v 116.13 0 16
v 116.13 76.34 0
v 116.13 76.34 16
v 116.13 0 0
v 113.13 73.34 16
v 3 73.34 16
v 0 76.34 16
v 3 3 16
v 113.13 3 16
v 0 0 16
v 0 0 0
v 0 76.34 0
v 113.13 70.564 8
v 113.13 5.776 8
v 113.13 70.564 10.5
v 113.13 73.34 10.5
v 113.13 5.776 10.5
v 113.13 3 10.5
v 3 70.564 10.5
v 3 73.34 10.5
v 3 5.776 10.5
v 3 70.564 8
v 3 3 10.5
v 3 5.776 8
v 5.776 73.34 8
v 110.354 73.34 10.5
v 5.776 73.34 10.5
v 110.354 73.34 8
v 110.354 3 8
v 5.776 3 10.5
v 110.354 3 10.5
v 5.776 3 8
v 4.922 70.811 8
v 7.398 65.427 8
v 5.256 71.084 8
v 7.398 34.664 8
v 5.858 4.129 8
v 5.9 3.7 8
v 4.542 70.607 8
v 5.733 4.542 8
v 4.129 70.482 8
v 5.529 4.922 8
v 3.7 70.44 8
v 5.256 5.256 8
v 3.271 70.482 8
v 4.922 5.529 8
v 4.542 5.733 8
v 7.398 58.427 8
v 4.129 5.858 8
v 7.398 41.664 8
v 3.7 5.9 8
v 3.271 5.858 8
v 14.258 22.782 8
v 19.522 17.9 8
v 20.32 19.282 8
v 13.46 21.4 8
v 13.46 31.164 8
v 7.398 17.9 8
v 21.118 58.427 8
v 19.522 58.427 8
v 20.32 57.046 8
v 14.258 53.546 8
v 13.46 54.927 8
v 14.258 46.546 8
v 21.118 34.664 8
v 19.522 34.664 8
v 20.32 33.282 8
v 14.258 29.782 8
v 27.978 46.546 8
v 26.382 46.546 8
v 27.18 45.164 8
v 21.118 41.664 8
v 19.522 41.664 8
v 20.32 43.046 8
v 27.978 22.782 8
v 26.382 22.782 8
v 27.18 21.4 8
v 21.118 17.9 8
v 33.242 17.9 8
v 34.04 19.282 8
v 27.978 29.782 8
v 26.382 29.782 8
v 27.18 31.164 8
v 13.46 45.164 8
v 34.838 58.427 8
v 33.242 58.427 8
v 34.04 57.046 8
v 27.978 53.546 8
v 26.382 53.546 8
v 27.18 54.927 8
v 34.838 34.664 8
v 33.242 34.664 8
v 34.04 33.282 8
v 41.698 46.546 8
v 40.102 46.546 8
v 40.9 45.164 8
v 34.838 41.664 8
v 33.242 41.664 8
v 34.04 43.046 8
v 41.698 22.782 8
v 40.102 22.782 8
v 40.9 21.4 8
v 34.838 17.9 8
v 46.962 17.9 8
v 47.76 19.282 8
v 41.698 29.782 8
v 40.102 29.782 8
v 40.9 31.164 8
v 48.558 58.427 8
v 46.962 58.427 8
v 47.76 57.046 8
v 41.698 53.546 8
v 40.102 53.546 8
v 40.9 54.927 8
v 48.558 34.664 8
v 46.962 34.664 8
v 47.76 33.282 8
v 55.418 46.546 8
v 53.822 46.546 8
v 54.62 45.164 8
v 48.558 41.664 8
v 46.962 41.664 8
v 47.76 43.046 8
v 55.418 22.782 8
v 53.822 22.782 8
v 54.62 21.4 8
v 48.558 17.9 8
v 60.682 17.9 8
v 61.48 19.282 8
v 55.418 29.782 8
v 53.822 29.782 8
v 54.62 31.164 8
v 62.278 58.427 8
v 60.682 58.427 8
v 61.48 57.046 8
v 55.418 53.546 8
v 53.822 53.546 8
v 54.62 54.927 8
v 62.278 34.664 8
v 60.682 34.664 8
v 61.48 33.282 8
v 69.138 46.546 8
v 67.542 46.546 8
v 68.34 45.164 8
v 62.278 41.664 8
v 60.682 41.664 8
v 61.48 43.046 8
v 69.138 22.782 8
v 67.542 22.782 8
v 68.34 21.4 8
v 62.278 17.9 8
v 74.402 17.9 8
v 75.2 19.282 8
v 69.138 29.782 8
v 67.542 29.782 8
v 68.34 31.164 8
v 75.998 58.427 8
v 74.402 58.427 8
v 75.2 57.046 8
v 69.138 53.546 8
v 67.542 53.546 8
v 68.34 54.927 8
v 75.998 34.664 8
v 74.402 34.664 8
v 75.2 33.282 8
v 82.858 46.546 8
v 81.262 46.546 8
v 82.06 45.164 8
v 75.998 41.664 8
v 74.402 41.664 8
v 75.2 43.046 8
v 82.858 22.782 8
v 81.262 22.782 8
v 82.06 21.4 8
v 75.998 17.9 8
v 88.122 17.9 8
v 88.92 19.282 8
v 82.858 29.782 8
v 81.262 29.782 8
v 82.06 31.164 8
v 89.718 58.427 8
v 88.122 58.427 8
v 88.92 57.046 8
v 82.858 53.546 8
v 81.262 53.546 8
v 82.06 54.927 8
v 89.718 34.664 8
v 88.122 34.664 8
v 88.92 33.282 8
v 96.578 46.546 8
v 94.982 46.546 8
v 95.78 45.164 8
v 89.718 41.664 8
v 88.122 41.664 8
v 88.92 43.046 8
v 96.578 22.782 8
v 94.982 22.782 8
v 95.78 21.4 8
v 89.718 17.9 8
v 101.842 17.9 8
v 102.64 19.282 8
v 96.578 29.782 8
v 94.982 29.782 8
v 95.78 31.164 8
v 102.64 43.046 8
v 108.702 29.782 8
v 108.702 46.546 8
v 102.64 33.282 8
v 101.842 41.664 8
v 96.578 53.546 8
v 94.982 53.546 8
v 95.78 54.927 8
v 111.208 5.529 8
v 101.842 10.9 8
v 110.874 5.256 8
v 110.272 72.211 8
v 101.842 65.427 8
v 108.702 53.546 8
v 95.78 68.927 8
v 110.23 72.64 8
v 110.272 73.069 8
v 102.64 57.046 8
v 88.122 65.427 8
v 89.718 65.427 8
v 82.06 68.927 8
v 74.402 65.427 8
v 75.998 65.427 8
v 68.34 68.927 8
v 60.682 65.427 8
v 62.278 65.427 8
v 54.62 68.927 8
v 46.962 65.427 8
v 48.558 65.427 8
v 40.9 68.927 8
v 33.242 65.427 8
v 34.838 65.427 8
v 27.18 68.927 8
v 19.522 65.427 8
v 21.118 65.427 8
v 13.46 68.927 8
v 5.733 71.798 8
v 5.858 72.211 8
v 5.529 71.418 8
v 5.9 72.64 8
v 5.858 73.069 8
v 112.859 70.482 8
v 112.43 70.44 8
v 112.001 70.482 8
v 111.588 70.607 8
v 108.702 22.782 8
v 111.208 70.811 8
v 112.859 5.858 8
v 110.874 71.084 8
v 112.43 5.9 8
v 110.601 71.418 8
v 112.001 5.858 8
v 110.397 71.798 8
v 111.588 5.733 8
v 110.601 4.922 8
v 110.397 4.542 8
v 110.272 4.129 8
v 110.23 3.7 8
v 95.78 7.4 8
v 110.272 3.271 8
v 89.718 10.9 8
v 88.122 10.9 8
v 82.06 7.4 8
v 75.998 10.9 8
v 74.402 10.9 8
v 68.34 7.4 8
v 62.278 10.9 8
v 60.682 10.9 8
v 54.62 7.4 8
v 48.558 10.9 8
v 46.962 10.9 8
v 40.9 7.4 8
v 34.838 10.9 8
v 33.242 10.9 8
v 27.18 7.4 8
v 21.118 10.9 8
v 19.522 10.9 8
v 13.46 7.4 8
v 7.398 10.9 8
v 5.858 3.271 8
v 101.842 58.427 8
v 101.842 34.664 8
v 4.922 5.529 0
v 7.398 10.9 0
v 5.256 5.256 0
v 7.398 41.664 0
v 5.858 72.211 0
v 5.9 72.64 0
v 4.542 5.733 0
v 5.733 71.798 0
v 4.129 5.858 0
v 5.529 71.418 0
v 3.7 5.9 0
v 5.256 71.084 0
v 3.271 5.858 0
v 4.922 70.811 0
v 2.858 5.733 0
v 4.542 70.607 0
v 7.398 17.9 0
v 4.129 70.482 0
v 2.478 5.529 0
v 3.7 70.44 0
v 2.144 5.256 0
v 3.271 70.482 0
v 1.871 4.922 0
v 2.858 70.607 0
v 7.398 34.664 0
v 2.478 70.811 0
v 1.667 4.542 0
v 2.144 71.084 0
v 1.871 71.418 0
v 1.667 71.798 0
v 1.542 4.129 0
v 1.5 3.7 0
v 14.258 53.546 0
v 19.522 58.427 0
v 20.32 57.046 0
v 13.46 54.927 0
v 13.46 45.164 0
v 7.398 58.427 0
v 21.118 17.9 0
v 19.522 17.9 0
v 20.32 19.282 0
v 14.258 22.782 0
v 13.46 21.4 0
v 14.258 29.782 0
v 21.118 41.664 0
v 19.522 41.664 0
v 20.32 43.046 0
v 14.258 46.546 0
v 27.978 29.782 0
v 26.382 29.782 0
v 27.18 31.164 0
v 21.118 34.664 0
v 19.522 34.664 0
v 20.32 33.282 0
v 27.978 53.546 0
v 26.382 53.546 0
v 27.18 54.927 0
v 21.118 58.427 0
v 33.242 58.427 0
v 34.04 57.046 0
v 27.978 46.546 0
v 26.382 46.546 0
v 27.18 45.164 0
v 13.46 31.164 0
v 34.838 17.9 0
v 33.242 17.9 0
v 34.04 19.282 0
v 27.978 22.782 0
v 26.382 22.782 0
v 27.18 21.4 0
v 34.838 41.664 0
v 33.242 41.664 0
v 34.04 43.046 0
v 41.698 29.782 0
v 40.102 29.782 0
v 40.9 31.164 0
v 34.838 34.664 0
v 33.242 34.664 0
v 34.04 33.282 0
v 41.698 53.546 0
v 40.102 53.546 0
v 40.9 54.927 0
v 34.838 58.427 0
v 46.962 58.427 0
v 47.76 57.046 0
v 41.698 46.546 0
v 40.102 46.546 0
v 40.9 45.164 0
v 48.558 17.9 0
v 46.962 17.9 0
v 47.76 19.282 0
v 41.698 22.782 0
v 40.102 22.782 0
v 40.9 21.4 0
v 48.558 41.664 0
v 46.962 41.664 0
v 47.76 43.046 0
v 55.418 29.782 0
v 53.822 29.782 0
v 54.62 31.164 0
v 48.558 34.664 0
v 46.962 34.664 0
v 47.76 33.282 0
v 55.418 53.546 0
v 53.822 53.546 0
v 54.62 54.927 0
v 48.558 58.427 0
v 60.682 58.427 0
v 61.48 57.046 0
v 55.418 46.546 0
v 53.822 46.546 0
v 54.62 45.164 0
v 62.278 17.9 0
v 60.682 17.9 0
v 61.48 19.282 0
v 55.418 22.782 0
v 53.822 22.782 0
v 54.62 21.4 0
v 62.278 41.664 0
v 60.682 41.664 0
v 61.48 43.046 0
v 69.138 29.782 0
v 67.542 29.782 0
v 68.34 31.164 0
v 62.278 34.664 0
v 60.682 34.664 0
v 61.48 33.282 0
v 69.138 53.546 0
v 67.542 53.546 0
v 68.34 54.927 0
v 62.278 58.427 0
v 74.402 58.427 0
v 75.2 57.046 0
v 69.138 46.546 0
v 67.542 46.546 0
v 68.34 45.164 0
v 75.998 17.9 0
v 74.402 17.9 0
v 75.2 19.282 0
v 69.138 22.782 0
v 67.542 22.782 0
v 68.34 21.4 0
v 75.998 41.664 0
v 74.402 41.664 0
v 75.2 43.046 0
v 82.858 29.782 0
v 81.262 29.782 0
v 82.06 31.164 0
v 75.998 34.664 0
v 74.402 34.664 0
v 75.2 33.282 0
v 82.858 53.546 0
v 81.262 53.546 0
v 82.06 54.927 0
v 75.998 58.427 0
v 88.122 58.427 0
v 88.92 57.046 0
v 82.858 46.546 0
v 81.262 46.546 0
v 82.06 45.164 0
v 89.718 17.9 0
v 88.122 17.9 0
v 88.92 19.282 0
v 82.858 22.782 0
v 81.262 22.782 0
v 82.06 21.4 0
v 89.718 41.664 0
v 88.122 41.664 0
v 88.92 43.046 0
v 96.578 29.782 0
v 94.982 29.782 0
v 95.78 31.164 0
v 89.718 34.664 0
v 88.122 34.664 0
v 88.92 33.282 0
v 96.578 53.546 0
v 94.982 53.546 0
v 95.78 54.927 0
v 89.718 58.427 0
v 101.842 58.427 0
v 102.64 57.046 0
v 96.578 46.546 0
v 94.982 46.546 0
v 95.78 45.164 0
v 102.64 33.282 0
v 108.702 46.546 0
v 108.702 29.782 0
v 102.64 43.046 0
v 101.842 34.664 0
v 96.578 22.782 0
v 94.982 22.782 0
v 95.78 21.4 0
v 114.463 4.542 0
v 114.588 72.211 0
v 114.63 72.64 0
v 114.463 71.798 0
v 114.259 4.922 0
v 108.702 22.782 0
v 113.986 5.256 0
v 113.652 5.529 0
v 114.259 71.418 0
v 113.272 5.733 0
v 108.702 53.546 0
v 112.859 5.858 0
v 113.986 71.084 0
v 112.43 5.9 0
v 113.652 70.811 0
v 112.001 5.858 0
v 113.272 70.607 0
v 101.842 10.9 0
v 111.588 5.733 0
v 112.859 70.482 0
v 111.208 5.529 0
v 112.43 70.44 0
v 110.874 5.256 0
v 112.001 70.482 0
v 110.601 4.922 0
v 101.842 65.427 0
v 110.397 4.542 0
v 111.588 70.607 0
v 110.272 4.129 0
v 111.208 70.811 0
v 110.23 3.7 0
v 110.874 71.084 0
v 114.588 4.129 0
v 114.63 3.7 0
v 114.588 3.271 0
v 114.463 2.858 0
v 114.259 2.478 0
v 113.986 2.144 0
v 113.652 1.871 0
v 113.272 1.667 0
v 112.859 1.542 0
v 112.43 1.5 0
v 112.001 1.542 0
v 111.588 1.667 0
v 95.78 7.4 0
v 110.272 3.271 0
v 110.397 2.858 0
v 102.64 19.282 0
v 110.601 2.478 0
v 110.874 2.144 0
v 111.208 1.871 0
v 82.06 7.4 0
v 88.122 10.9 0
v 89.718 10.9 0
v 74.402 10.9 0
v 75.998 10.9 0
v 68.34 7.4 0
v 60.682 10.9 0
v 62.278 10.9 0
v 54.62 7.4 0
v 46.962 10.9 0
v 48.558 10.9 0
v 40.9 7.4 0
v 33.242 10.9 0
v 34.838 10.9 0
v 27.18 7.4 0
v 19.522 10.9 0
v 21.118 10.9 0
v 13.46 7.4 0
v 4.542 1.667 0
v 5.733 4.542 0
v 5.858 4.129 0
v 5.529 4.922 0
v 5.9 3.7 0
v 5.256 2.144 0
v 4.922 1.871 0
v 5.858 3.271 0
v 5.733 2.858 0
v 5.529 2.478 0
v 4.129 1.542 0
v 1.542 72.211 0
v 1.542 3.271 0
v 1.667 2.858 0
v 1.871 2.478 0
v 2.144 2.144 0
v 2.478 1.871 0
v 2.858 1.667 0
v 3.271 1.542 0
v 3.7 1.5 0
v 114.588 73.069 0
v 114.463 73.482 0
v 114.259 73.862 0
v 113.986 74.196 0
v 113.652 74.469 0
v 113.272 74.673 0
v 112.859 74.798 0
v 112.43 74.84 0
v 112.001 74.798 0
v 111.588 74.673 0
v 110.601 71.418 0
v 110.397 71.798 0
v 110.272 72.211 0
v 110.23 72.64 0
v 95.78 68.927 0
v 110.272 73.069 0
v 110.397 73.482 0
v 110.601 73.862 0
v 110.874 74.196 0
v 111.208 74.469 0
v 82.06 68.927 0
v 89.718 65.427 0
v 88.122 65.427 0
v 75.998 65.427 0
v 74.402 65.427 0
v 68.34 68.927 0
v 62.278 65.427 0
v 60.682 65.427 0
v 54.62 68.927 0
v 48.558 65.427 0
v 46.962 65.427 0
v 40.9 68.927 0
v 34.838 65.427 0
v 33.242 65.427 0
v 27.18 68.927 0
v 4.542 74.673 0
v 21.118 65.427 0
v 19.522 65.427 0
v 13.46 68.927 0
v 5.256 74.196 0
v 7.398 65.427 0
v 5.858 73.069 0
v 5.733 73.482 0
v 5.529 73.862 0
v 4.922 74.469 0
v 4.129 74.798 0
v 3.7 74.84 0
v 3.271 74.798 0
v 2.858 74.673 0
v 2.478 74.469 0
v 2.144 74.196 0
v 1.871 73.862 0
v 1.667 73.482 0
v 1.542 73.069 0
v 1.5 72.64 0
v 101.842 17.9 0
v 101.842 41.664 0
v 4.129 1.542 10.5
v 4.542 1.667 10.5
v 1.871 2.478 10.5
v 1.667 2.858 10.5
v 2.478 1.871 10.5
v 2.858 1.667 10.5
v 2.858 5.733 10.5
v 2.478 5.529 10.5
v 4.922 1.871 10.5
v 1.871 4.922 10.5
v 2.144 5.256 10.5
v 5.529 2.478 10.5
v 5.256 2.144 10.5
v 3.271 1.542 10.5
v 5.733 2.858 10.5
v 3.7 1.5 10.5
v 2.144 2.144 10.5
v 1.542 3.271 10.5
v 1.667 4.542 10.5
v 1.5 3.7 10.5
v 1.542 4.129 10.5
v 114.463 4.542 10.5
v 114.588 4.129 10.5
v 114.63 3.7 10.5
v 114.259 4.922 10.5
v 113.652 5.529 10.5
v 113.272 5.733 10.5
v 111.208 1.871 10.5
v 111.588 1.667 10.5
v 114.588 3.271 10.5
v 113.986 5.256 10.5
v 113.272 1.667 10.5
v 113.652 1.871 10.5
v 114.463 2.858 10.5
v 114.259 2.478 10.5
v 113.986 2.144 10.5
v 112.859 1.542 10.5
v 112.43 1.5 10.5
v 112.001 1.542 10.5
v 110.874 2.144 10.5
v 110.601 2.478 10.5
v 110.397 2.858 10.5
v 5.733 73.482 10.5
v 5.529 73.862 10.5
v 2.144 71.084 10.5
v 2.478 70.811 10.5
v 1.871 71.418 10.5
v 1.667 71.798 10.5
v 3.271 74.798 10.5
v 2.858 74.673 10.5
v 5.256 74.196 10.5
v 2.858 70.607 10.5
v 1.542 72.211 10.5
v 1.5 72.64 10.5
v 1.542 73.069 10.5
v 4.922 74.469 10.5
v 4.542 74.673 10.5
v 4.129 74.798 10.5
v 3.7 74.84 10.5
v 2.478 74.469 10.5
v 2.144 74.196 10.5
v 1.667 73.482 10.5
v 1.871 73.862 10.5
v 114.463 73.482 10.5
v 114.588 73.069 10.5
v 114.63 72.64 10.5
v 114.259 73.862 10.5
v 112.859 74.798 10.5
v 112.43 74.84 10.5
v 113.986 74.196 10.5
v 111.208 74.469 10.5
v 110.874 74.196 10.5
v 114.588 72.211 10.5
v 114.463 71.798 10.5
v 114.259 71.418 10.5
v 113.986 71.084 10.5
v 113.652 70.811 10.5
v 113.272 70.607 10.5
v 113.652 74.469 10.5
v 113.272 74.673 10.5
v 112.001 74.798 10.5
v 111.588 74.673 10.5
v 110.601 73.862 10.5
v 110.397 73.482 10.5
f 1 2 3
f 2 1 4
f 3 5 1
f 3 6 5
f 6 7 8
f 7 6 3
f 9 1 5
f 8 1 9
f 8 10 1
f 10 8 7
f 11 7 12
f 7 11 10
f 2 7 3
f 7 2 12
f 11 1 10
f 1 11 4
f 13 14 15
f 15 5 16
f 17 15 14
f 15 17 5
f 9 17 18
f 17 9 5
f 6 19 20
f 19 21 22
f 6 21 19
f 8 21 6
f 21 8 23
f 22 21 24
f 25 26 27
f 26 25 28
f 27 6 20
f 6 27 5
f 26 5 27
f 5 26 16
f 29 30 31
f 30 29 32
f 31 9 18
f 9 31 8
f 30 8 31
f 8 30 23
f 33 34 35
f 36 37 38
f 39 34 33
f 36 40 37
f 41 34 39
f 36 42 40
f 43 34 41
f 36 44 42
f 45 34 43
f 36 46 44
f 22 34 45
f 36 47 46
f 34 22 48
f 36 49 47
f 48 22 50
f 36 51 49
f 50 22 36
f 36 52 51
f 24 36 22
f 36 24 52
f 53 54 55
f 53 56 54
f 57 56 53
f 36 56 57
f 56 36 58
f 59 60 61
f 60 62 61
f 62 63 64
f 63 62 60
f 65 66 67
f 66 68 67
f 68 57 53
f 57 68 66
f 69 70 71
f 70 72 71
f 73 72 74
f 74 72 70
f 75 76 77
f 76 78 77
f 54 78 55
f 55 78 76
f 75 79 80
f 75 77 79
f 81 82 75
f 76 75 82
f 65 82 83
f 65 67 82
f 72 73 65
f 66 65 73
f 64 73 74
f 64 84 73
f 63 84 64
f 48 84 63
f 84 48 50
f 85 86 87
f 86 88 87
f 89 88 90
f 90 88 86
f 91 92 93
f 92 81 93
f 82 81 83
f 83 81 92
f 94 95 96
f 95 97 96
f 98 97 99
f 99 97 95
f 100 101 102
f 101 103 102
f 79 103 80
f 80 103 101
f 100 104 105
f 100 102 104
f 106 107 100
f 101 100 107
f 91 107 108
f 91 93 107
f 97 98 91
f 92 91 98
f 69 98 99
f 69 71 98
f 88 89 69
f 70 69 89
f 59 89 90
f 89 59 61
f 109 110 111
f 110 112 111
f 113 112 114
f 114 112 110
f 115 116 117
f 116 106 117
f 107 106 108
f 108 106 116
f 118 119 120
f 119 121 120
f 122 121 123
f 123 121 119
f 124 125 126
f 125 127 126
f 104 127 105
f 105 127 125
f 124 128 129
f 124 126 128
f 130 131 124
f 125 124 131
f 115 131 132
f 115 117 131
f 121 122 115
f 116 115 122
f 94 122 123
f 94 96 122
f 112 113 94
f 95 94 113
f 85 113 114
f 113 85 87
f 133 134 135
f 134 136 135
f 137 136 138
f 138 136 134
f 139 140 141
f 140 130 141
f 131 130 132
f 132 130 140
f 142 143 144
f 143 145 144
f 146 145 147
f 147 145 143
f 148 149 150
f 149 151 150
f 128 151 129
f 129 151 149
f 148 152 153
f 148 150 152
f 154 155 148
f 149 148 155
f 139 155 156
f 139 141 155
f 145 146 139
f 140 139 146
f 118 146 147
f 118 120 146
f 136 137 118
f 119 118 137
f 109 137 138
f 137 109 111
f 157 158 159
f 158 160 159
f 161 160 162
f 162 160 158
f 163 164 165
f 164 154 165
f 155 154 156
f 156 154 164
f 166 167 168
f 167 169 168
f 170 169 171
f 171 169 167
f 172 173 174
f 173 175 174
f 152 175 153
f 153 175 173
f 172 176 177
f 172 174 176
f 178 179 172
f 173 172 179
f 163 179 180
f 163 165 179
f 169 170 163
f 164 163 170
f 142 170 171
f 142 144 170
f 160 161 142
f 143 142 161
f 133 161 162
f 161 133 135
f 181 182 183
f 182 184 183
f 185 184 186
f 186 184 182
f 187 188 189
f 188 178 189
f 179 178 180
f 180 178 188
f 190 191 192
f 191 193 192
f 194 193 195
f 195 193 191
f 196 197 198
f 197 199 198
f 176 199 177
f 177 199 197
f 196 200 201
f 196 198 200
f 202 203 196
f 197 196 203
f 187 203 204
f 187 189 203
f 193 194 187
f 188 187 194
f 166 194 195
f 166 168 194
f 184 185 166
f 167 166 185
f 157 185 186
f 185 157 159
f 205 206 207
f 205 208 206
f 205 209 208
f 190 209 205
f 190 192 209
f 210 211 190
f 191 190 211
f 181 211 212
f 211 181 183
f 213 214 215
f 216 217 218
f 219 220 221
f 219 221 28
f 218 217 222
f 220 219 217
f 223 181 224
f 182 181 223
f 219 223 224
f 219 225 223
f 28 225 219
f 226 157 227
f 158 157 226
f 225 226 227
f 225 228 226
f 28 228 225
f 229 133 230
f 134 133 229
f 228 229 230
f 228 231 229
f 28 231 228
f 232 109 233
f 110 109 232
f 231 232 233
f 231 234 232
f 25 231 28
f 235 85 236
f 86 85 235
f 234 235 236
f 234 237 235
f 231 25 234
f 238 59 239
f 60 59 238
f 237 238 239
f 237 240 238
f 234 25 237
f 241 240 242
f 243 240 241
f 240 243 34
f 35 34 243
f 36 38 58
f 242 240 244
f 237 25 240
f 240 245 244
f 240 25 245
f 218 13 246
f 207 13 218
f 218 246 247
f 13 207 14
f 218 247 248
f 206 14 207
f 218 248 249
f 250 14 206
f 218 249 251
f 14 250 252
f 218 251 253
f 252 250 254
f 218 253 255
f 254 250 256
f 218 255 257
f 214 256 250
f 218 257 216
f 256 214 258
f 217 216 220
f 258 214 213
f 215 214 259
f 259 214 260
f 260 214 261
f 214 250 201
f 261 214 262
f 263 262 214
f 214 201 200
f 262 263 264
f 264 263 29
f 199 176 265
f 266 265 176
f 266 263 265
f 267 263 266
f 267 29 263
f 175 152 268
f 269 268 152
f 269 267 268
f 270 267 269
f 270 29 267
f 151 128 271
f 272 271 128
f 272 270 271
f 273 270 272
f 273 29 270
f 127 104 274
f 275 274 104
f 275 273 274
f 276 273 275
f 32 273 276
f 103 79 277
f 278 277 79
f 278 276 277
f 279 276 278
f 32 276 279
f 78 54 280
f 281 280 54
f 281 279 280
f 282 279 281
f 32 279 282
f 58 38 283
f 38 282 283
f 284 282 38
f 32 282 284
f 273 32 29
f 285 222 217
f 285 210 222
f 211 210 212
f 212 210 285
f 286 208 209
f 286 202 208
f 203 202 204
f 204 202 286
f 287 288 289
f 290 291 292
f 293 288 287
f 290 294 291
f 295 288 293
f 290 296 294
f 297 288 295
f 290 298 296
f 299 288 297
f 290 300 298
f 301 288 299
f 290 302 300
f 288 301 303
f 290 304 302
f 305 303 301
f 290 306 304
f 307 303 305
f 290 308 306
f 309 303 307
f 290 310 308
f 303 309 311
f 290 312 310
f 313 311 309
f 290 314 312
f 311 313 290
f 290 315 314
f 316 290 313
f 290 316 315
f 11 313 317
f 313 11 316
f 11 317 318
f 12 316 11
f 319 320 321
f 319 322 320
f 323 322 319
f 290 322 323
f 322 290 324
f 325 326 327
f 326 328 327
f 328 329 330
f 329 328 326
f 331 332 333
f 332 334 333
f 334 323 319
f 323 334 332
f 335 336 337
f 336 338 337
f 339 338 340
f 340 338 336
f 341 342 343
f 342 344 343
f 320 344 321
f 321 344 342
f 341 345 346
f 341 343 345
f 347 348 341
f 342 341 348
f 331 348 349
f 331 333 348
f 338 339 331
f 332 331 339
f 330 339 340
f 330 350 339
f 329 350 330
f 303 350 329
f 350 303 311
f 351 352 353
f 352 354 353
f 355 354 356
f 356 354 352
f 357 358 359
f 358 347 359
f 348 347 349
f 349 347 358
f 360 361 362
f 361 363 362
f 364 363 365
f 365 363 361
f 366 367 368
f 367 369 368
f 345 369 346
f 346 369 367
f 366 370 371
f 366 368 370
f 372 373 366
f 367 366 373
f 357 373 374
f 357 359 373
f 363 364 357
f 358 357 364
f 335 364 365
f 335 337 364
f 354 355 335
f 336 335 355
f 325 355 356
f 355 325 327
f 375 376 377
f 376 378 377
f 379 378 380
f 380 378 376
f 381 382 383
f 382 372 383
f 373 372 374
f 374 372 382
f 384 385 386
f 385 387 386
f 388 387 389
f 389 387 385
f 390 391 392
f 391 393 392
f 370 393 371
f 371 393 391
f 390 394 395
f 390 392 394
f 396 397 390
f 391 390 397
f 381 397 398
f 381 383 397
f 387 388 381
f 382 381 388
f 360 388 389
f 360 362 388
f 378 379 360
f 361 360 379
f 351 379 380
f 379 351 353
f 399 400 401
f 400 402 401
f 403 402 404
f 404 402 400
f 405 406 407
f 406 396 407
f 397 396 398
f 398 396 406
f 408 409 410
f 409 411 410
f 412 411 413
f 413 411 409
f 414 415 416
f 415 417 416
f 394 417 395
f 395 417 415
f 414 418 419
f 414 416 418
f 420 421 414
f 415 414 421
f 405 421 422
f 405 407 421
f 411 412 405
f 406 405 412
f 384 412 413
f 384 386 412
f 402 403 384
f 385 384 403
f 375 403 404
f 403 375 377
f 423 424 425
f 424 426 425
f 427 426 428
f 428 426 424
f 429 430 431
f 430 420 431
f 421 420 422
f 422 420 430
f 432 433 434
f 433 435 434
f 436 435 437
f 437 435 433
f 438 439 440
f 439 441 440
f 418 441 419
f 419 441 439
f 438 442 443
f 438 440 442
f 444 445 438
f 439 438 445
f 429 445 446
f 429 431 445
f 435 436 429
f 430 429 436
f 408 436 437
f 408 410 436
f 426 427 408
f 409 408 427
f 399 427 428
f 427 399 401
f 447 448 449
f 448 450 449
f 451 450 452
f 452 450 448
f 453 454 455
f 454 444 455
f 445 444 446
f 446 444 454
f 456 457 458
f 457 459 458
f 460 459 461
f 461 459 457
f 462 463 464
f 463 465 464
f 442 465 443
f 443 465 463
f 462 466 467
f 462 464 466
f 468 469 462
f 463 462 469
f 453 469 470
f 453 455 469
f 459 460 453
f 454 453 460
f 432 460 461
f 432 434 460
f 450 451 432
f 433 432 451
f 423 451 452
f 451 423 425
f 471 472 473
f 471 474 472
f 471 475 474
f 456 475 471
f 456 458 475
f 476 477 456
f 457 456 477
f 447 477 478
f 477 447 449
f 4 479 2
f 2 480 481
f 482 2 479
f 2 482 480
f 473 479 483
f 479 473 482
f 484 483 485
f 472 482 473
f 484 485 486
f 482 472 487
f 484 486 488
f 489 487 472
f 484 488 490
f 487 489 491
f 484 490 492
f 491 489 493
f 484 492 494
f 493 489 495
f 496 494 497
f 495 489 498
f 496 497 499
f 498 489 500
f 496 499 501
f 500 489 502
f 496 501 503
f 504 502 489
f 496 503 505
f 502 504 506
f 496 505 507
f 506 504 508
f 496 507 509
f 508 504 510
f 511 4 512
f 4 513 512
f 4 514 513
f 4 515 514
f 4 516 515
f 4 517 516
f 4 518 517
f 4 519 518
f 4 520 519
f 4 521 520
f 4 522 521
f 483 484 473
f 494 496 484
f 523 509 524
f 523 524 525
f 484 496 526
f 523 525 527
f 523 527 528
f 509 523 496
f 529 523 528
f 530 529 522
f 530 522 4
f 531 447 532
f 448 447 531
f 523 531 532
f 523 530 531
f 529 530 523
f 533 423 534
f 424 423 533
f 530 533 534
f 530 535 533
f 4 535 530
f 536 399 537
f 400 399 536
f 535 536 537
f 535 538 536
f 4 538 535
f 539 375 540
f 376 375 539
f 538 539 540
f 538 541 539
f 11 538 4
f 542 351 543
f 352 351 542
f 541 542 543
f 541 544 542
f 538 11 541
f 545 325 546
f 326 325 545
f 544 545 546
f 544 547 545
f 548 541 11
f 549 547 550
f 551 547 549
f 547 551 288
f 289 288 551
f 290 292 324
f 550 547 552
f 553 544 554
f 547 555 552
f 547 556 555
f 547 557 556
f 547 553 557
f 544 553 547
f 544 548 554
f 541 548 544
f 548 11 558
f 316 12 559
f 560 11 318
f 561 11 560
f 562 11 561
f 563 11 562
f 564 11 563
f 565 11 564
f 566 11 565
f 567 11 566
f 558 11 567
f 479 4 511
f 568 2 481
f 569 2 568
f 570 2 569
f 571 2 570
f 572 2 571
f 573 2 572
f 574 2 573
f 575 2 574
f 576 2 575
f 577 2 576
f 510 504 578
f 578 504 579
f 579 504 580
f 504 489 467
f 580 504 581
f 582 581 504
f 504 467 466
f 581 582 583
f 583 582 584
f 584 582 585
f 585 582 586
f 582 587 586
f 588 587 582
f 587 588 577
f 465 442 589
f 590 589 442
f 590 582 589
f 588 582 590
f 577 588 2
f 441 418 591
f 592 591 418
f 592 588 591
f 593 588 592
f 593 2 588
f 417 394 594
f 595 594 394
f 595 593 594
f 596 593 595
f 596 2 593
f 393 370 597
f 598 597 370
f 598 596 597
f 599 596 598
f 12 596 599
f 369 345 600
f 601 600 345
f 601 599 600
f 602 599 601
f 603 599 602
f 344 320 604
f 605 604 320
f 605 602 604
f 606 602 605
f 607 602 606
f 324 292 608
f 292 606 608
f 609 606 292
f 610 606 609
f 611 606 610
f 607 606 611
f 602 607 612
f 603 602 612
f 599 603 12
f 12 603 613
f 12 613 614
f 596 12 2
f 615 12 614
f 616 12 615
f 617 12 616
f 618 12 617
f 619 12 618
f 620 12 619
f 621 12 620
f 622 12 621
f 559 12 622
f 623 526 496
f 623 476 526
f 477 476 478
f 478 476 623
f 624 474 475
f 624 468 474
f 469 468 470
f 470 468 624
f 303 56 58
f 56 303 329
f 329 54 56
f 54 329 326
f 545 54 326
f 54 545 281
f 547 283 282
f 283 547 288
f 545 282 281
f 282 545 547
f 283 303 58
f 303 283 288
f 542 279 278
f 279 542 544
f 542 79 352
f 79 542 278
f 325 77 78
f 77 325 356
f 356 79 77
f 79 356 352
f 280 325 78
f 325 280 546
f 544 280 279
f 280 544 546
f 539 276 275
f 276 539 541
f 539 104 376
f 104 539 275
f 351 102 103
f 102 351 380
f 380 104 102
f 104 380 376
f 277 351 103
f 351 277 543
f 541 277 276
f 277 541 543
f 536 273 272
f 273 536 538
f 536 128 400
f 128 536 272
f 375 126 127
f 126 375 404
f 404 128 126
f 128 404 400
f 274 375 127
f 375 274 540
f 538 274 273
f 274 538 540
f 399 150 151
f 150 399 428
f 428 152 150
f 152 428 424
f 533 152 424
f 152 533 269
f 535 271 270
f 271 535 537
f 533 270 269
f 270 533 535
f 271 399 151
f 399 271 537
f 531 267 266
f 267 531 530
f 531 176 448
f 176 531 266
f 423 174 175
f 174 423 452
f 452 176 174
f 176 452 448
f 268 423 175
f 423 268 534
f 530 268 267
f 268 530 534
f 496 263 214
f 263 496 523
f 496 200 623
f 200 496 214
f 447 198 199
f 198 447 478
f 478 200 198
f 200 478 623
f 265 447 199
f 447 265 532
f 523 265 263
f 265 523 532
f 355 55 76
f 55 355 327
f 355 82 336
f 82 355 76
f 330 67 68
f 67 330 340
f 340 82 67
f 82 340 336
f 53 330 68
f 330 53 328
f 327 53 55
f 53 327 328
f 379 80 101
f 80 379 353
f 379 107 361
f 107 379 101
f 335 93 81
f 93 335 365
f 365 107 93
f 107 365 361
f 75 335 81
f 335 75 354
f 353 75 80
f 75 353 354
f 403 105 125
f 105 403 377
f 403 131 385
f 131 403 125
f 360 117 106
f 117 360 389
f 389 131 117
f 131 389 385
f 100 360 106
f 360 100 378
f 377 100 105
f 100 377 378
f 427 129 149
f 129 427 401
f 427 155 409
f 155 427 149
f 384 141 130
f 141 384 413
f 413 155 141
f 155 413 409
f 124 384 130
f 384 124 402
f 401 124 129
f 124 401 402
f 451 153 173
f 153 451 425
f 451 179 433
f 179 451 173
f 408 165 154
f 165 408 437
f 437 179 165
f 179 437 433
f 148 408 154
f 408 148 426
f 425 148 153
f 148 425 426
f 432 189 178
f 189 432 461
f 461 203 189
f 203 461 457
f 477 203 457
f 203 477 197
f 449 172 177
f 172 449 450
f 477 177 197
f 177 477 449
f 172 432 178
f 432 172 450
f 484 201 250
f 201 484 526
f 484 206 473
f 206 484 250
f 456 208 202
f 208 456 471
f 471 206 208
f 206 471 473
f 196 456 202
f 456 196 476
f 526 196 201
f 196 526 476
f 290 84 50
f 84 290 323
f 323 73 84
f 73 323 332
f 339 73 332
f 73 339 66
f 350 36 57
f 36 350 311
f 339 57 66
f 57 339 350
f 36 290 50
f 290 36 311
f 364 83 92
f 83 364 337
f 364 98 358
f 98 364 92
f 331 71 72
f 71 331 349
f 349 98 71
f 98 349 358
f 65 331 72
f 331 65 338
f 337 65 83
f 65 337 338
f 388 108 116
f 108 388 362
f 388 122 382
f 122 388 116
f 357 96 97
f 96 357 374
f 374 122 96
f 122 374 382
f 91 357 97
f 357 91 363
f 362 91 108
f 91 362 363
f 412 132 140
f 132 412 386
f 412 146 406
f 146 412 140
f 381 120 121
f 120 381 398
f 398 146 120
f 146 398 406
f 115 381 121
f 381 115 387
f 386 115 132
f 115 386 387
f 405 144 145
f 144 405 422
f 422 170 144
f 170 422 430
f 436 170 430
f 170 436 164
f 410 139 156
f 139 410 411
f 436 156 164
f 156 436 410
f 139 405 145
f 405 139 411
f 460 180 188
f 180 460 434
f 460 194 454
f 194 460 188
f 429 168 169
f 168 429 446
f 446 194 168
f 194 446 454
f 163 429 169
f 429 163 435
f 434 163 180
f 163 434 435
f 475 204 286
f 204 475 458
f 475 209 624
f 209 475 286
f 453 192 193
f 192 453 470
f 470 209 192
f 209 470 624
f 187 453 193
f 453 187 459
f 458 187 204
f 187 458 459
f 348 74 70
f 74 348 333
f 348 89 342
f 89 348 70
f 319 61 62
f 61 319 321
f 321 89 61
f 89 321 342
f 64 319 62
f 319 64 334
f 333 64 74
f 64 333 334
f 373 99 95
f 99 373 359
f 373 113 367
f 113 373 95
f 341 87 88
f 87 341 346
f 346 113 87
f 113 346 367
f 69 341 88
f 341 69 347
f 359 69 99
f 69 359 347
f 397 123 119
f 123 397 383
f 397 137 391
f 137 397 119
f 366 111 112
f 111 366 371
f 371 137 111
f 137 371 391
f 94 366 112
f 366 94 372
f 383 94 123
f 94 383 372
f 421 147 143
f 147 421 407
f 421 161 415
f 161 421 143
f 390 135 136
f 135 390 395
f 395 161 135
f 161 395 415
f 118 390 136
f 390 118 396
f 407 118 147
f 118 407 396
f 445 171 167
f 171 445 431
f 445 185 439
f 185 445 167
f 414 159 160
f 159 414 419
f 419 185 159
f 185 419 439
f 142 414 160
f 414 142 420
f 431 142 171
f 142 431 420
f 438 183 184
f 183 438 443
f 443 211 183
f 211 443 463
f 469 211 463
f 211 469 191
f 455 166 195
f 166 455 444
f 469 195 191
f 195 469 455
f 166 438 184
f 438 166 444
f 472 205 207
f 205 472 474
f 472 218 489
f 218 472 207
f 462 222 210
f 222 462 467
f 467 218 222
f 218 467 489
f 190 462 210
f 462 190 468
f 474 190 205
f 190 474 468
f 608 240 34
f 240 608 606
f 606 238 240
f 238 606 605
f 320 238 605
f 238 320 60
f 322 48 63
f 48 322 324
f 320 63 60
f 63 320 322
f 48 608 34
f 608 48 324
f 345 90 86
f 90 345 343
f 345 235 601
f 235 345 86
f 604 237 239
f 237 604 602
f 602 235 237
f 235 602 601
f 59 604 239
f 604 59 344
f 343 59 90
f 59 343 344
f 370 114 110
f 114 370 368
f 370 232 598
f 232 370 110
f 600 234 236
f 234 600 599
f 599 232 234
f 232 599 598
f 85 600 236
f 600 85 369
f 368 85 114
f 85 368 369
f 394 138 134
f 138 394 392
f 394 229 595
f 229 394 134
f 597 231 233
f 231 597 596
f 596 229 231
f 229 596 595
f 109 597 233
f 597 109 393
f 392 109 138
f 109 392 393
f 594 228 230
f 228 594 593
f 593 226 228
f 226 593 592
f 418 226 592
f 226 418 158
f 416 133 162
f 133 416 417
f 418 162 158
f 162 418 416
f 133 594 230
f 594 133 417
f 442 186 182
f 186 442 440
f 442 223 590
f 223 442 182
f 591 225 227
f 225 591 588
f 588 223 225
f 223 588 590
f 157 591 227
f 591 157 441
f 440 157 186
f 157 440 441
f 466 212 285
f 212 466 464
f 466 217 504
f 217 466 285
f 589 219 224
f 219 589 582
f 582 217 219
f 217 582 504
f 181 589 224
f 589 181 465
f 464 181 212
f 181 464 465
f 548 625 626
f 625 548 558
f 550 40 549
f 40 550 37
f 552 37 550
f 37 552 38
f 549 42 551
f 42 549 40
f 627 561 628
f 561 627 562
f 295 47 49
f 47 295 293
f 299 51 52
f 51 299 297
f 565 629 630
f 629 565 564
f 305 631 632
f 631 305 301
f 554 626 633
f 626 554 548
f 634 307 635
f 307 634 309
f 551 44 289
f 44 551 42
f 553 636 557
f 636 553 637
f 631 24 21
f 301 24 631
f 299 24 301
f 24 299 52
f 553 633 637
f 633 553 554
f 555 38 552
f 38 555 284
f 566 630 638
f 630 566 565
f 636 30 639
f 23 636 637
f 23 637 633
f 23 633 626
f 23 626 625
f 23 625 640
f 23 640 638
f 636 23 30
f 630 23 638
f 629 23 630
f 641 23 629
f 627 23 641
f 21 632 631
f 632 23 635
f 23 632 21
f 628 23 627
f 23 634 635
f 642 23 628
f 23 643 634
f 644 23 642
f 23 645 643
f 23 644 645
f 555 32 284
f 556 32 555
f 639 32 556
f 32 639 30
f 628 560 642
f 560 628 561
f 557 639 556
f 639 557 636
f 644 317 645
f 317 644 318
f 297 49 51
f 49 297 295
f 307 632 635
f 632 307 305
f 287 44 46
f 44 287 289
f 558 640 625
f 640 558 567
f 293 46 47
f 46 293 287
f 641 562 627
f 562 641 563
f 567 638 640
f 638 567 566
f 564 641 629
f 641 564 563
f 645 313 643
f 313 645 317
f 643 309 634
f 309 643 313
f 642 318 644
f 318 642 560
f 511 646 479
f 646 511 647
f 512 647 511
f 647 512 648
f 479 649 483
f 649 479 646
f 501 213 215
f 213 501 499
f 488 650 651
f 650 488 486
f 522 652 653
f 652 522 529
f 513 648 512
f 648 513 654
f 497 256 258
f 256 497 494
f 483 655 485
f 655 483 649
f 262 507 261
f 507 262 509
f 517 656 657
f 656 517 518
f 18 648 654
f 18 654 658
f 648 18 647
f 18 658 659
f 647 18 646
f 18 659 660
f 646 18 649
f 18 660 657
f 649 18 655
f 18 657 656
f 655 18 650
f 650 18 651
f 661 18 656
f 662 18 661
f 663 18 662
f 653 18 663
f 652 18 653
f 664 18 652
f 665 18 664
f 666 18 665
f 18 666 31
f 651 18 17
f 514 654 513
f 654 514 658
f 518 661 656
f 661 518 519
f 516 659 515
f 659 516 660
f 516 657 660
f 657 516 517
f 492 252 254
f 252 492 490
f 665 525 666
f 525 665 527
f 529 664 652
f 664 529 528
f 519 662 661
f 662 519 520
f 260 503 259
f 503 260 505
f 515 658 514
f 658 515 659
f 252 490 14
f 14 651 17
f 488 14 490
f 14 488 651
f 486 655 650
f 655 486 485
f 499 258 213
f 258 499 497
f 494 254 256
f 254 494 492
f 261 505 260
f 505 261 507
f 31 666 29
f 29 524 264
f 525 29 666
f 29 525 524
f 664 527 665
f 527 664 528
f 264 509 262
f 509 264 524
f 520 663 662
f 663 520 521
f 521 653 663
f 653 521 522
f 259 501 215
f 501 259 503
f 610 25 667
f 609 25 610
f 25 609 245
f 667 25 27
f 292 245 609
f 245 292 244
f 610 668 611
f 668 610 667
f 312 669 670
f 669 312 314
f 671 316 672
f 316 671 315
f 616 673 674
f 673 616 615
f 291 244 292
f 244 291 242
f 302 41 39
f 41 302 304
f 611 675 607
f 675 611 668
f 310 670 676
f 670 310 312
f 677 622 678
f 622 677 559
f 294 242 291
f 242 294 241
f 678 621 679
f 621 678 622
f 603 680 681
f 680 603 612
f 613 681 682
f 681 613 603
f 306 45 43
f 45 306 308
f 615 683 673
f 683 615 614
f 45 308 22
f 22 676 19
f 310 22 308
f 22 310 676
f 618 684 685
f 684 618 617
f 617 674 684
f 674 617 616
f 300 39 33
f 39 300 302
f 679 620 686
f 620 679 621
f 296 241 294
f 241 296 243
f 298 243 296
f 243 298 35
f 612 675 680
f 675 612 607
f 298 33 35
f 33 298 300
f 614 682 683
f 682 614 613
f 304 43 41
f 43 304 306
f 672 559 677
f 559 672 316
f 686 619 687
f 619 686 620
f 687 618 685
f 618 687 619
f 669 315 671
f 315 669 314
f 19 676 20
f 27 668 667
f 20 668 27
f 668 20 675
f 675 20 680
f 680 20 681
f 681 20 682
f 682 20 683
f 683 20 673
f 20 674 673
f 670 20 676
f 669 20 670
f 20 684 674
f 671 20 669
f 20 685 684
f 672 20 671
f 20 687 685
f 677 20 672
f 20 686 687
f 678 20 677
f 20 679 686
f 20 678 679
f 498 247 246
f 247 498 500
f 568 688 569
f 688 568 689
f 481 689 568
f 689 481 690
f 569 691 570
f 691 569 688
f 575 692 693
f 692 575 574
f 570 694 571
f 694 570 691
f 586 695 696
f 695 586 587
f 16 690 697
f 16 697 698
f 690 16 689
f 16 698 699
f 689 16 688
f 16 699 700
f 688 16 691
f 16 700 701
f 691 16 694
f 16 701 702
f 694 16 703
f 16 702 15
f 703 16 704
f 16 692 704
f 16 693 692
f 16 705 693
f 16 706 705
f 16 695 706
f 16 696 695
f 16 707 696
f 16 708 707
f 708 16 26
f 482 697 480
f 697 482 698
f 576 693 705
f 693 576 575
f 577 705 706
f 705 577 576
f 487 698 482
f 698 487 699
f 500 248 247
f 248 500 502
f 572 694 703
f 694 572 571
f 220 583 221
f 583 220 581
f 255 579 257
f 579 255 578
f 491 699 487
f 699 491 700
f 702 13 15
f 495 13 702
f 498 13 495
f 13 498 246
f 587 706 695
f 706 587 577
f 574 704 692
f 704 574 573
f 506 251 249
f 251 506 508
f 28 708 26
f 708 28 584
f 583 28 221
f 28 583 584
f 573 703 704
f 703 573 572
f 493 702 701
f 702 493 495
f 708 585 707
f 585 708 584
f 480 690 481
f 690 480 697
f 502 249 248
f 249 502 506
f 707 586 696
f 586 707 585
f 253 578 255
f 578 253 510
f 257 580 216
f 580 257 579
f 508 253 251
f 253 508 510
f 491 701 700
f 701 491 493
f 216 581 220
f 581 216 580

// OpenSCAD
$fn = 32;

// ----------------------------------------------------------------------
// Honeycomb panel: 116.13 x 76.34 mm, 35 cells of 14 mm
// ----------------------------------------------------------------------

// --- parameters (mm) ---
panel_w = 116.13;         // panel width
panel_d = 76.34;          // panel depth
thick = 8;                // panel thickness
cell_r = 7;               // hex cell circumradius
pitch = 13.72;            // hex cell pitch (centre to centre)
web = 1.6;                // web between the cells
columns = 7;              // columns of cells
rows = 5;                 // rows of cells
cell_count = 35;          // total cells
shift_x = 13.46;          // first cell offset in x
shift_y = 14.4;           // first cell offset in y
mount_d = 4.4;            // corner mounting holes
hole_off = 3.7;           // mounting hole offset from the corners
rim_h = 16;               // rim height
rim_t = 3;                // rim wall thickness

difference() {
  union() {
    cube([panel_w, panel_d, thick]);
    /* rim around the panel, sunk 1 mm into the plate */
    translate([0, 0, thick - 1]) difference() {
      cube([panel_w, panel_d, rim_h - thick + 1]);
      translate([rim_t, rim_t, -2.5]) cube([panel_w - 2 * rim_t, panel_d - 2 * rim_t, rim_h - thick + 6]);
    }
  }
  /* hexagonal cells, point-up, cut right through the plate */
  for (row = [0 : rows - 1]) {
    for (col = [0 : columns - 1]) {
      translate([shift_x + col * pitch + (row % 2) * pitch / 2, shift_y + row * pitch * 0.866025, -2.5]) rotate([0, 0, 30]) cylinder(h = thick + 5, d = 2 * cell_r, $fn = 6);
    }
  }
  /* corner mounting holes, clear of the outer cell web */
  translate([3.7, 3.7, -2.5]) cylinder(h = thick + 5, d = mount_d);
  translate([112.43, 3.7, -2.5]) cylinder(h = thick + 5, d = mount_d);
  translate([3.7, 72.64, -2.5]) cylinder(h = thick + 5, d = mount_d);
  translate([112.43, 72.64, -2.5]) cylinder(h = thick + 5, d = mount_d);
}
